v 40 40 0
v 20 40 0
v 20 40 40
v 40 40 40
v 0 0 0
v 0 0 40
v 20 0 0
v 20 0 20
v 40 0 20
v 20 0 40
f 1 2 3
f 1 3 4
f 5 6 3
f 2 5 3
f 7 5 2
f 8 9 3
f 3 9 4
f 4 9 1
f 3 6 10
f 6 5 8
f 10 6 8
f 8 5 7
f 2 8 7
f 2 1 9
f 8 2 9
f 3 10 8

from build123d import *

# Parameters (mm, degrees)
SKETCH1_W           = 40
SKETCH1_H           = 40
BOSS_EXTRUDE1_DEPTH = 40
CUT_EXTRUDE1_DEPTH  = 40
CUT_EXTRUDE3_DEPTH  = 20


with BuildPart() as part:
    # Sketch1 → Boss-Extrude1 (new body)
    with BuildSketch(Plane.XY):
        with Locations((20, 20)):
            Rectangle(SKETCH1_W, SKETCH1_H)
    extrude(amount=BOSS_EXTRUDE1_DEPTH)

    # Sketch2 → Cut-Extrude1 (cut)
    with BuildSketch(Plane.XY.offset(40)):
        Polygon((0, 0), (20, 40), (0, 40), align=None)
    extrude(amount=-CUT_EXTRUDE1_DEPTH, mode=Mode.SUBTRACT)

    # Sketch3 → Cut-Extrude3 (cut)
    with BuildSketch(Plane(origin=(40, 0, 0), x_dir=(0, 0, -1), z_dir=(1, 0, 0))):
        Polygon((-40, 40), (-40, 0), (-30, 20), align=None)
        Polygon((-30, 20), (-40, 0), (-20, 0), align=None)
        Polygon((-10, 20), (0, 0), (0, 40), align=None)
        Polygon((-10, 20), (-20, 0), (0, 0), align=None)
    extrude(amount=-CUT_EXTRUDE3_DEPTH, mode=Mode.SUBTRACT)


solid = part.part
